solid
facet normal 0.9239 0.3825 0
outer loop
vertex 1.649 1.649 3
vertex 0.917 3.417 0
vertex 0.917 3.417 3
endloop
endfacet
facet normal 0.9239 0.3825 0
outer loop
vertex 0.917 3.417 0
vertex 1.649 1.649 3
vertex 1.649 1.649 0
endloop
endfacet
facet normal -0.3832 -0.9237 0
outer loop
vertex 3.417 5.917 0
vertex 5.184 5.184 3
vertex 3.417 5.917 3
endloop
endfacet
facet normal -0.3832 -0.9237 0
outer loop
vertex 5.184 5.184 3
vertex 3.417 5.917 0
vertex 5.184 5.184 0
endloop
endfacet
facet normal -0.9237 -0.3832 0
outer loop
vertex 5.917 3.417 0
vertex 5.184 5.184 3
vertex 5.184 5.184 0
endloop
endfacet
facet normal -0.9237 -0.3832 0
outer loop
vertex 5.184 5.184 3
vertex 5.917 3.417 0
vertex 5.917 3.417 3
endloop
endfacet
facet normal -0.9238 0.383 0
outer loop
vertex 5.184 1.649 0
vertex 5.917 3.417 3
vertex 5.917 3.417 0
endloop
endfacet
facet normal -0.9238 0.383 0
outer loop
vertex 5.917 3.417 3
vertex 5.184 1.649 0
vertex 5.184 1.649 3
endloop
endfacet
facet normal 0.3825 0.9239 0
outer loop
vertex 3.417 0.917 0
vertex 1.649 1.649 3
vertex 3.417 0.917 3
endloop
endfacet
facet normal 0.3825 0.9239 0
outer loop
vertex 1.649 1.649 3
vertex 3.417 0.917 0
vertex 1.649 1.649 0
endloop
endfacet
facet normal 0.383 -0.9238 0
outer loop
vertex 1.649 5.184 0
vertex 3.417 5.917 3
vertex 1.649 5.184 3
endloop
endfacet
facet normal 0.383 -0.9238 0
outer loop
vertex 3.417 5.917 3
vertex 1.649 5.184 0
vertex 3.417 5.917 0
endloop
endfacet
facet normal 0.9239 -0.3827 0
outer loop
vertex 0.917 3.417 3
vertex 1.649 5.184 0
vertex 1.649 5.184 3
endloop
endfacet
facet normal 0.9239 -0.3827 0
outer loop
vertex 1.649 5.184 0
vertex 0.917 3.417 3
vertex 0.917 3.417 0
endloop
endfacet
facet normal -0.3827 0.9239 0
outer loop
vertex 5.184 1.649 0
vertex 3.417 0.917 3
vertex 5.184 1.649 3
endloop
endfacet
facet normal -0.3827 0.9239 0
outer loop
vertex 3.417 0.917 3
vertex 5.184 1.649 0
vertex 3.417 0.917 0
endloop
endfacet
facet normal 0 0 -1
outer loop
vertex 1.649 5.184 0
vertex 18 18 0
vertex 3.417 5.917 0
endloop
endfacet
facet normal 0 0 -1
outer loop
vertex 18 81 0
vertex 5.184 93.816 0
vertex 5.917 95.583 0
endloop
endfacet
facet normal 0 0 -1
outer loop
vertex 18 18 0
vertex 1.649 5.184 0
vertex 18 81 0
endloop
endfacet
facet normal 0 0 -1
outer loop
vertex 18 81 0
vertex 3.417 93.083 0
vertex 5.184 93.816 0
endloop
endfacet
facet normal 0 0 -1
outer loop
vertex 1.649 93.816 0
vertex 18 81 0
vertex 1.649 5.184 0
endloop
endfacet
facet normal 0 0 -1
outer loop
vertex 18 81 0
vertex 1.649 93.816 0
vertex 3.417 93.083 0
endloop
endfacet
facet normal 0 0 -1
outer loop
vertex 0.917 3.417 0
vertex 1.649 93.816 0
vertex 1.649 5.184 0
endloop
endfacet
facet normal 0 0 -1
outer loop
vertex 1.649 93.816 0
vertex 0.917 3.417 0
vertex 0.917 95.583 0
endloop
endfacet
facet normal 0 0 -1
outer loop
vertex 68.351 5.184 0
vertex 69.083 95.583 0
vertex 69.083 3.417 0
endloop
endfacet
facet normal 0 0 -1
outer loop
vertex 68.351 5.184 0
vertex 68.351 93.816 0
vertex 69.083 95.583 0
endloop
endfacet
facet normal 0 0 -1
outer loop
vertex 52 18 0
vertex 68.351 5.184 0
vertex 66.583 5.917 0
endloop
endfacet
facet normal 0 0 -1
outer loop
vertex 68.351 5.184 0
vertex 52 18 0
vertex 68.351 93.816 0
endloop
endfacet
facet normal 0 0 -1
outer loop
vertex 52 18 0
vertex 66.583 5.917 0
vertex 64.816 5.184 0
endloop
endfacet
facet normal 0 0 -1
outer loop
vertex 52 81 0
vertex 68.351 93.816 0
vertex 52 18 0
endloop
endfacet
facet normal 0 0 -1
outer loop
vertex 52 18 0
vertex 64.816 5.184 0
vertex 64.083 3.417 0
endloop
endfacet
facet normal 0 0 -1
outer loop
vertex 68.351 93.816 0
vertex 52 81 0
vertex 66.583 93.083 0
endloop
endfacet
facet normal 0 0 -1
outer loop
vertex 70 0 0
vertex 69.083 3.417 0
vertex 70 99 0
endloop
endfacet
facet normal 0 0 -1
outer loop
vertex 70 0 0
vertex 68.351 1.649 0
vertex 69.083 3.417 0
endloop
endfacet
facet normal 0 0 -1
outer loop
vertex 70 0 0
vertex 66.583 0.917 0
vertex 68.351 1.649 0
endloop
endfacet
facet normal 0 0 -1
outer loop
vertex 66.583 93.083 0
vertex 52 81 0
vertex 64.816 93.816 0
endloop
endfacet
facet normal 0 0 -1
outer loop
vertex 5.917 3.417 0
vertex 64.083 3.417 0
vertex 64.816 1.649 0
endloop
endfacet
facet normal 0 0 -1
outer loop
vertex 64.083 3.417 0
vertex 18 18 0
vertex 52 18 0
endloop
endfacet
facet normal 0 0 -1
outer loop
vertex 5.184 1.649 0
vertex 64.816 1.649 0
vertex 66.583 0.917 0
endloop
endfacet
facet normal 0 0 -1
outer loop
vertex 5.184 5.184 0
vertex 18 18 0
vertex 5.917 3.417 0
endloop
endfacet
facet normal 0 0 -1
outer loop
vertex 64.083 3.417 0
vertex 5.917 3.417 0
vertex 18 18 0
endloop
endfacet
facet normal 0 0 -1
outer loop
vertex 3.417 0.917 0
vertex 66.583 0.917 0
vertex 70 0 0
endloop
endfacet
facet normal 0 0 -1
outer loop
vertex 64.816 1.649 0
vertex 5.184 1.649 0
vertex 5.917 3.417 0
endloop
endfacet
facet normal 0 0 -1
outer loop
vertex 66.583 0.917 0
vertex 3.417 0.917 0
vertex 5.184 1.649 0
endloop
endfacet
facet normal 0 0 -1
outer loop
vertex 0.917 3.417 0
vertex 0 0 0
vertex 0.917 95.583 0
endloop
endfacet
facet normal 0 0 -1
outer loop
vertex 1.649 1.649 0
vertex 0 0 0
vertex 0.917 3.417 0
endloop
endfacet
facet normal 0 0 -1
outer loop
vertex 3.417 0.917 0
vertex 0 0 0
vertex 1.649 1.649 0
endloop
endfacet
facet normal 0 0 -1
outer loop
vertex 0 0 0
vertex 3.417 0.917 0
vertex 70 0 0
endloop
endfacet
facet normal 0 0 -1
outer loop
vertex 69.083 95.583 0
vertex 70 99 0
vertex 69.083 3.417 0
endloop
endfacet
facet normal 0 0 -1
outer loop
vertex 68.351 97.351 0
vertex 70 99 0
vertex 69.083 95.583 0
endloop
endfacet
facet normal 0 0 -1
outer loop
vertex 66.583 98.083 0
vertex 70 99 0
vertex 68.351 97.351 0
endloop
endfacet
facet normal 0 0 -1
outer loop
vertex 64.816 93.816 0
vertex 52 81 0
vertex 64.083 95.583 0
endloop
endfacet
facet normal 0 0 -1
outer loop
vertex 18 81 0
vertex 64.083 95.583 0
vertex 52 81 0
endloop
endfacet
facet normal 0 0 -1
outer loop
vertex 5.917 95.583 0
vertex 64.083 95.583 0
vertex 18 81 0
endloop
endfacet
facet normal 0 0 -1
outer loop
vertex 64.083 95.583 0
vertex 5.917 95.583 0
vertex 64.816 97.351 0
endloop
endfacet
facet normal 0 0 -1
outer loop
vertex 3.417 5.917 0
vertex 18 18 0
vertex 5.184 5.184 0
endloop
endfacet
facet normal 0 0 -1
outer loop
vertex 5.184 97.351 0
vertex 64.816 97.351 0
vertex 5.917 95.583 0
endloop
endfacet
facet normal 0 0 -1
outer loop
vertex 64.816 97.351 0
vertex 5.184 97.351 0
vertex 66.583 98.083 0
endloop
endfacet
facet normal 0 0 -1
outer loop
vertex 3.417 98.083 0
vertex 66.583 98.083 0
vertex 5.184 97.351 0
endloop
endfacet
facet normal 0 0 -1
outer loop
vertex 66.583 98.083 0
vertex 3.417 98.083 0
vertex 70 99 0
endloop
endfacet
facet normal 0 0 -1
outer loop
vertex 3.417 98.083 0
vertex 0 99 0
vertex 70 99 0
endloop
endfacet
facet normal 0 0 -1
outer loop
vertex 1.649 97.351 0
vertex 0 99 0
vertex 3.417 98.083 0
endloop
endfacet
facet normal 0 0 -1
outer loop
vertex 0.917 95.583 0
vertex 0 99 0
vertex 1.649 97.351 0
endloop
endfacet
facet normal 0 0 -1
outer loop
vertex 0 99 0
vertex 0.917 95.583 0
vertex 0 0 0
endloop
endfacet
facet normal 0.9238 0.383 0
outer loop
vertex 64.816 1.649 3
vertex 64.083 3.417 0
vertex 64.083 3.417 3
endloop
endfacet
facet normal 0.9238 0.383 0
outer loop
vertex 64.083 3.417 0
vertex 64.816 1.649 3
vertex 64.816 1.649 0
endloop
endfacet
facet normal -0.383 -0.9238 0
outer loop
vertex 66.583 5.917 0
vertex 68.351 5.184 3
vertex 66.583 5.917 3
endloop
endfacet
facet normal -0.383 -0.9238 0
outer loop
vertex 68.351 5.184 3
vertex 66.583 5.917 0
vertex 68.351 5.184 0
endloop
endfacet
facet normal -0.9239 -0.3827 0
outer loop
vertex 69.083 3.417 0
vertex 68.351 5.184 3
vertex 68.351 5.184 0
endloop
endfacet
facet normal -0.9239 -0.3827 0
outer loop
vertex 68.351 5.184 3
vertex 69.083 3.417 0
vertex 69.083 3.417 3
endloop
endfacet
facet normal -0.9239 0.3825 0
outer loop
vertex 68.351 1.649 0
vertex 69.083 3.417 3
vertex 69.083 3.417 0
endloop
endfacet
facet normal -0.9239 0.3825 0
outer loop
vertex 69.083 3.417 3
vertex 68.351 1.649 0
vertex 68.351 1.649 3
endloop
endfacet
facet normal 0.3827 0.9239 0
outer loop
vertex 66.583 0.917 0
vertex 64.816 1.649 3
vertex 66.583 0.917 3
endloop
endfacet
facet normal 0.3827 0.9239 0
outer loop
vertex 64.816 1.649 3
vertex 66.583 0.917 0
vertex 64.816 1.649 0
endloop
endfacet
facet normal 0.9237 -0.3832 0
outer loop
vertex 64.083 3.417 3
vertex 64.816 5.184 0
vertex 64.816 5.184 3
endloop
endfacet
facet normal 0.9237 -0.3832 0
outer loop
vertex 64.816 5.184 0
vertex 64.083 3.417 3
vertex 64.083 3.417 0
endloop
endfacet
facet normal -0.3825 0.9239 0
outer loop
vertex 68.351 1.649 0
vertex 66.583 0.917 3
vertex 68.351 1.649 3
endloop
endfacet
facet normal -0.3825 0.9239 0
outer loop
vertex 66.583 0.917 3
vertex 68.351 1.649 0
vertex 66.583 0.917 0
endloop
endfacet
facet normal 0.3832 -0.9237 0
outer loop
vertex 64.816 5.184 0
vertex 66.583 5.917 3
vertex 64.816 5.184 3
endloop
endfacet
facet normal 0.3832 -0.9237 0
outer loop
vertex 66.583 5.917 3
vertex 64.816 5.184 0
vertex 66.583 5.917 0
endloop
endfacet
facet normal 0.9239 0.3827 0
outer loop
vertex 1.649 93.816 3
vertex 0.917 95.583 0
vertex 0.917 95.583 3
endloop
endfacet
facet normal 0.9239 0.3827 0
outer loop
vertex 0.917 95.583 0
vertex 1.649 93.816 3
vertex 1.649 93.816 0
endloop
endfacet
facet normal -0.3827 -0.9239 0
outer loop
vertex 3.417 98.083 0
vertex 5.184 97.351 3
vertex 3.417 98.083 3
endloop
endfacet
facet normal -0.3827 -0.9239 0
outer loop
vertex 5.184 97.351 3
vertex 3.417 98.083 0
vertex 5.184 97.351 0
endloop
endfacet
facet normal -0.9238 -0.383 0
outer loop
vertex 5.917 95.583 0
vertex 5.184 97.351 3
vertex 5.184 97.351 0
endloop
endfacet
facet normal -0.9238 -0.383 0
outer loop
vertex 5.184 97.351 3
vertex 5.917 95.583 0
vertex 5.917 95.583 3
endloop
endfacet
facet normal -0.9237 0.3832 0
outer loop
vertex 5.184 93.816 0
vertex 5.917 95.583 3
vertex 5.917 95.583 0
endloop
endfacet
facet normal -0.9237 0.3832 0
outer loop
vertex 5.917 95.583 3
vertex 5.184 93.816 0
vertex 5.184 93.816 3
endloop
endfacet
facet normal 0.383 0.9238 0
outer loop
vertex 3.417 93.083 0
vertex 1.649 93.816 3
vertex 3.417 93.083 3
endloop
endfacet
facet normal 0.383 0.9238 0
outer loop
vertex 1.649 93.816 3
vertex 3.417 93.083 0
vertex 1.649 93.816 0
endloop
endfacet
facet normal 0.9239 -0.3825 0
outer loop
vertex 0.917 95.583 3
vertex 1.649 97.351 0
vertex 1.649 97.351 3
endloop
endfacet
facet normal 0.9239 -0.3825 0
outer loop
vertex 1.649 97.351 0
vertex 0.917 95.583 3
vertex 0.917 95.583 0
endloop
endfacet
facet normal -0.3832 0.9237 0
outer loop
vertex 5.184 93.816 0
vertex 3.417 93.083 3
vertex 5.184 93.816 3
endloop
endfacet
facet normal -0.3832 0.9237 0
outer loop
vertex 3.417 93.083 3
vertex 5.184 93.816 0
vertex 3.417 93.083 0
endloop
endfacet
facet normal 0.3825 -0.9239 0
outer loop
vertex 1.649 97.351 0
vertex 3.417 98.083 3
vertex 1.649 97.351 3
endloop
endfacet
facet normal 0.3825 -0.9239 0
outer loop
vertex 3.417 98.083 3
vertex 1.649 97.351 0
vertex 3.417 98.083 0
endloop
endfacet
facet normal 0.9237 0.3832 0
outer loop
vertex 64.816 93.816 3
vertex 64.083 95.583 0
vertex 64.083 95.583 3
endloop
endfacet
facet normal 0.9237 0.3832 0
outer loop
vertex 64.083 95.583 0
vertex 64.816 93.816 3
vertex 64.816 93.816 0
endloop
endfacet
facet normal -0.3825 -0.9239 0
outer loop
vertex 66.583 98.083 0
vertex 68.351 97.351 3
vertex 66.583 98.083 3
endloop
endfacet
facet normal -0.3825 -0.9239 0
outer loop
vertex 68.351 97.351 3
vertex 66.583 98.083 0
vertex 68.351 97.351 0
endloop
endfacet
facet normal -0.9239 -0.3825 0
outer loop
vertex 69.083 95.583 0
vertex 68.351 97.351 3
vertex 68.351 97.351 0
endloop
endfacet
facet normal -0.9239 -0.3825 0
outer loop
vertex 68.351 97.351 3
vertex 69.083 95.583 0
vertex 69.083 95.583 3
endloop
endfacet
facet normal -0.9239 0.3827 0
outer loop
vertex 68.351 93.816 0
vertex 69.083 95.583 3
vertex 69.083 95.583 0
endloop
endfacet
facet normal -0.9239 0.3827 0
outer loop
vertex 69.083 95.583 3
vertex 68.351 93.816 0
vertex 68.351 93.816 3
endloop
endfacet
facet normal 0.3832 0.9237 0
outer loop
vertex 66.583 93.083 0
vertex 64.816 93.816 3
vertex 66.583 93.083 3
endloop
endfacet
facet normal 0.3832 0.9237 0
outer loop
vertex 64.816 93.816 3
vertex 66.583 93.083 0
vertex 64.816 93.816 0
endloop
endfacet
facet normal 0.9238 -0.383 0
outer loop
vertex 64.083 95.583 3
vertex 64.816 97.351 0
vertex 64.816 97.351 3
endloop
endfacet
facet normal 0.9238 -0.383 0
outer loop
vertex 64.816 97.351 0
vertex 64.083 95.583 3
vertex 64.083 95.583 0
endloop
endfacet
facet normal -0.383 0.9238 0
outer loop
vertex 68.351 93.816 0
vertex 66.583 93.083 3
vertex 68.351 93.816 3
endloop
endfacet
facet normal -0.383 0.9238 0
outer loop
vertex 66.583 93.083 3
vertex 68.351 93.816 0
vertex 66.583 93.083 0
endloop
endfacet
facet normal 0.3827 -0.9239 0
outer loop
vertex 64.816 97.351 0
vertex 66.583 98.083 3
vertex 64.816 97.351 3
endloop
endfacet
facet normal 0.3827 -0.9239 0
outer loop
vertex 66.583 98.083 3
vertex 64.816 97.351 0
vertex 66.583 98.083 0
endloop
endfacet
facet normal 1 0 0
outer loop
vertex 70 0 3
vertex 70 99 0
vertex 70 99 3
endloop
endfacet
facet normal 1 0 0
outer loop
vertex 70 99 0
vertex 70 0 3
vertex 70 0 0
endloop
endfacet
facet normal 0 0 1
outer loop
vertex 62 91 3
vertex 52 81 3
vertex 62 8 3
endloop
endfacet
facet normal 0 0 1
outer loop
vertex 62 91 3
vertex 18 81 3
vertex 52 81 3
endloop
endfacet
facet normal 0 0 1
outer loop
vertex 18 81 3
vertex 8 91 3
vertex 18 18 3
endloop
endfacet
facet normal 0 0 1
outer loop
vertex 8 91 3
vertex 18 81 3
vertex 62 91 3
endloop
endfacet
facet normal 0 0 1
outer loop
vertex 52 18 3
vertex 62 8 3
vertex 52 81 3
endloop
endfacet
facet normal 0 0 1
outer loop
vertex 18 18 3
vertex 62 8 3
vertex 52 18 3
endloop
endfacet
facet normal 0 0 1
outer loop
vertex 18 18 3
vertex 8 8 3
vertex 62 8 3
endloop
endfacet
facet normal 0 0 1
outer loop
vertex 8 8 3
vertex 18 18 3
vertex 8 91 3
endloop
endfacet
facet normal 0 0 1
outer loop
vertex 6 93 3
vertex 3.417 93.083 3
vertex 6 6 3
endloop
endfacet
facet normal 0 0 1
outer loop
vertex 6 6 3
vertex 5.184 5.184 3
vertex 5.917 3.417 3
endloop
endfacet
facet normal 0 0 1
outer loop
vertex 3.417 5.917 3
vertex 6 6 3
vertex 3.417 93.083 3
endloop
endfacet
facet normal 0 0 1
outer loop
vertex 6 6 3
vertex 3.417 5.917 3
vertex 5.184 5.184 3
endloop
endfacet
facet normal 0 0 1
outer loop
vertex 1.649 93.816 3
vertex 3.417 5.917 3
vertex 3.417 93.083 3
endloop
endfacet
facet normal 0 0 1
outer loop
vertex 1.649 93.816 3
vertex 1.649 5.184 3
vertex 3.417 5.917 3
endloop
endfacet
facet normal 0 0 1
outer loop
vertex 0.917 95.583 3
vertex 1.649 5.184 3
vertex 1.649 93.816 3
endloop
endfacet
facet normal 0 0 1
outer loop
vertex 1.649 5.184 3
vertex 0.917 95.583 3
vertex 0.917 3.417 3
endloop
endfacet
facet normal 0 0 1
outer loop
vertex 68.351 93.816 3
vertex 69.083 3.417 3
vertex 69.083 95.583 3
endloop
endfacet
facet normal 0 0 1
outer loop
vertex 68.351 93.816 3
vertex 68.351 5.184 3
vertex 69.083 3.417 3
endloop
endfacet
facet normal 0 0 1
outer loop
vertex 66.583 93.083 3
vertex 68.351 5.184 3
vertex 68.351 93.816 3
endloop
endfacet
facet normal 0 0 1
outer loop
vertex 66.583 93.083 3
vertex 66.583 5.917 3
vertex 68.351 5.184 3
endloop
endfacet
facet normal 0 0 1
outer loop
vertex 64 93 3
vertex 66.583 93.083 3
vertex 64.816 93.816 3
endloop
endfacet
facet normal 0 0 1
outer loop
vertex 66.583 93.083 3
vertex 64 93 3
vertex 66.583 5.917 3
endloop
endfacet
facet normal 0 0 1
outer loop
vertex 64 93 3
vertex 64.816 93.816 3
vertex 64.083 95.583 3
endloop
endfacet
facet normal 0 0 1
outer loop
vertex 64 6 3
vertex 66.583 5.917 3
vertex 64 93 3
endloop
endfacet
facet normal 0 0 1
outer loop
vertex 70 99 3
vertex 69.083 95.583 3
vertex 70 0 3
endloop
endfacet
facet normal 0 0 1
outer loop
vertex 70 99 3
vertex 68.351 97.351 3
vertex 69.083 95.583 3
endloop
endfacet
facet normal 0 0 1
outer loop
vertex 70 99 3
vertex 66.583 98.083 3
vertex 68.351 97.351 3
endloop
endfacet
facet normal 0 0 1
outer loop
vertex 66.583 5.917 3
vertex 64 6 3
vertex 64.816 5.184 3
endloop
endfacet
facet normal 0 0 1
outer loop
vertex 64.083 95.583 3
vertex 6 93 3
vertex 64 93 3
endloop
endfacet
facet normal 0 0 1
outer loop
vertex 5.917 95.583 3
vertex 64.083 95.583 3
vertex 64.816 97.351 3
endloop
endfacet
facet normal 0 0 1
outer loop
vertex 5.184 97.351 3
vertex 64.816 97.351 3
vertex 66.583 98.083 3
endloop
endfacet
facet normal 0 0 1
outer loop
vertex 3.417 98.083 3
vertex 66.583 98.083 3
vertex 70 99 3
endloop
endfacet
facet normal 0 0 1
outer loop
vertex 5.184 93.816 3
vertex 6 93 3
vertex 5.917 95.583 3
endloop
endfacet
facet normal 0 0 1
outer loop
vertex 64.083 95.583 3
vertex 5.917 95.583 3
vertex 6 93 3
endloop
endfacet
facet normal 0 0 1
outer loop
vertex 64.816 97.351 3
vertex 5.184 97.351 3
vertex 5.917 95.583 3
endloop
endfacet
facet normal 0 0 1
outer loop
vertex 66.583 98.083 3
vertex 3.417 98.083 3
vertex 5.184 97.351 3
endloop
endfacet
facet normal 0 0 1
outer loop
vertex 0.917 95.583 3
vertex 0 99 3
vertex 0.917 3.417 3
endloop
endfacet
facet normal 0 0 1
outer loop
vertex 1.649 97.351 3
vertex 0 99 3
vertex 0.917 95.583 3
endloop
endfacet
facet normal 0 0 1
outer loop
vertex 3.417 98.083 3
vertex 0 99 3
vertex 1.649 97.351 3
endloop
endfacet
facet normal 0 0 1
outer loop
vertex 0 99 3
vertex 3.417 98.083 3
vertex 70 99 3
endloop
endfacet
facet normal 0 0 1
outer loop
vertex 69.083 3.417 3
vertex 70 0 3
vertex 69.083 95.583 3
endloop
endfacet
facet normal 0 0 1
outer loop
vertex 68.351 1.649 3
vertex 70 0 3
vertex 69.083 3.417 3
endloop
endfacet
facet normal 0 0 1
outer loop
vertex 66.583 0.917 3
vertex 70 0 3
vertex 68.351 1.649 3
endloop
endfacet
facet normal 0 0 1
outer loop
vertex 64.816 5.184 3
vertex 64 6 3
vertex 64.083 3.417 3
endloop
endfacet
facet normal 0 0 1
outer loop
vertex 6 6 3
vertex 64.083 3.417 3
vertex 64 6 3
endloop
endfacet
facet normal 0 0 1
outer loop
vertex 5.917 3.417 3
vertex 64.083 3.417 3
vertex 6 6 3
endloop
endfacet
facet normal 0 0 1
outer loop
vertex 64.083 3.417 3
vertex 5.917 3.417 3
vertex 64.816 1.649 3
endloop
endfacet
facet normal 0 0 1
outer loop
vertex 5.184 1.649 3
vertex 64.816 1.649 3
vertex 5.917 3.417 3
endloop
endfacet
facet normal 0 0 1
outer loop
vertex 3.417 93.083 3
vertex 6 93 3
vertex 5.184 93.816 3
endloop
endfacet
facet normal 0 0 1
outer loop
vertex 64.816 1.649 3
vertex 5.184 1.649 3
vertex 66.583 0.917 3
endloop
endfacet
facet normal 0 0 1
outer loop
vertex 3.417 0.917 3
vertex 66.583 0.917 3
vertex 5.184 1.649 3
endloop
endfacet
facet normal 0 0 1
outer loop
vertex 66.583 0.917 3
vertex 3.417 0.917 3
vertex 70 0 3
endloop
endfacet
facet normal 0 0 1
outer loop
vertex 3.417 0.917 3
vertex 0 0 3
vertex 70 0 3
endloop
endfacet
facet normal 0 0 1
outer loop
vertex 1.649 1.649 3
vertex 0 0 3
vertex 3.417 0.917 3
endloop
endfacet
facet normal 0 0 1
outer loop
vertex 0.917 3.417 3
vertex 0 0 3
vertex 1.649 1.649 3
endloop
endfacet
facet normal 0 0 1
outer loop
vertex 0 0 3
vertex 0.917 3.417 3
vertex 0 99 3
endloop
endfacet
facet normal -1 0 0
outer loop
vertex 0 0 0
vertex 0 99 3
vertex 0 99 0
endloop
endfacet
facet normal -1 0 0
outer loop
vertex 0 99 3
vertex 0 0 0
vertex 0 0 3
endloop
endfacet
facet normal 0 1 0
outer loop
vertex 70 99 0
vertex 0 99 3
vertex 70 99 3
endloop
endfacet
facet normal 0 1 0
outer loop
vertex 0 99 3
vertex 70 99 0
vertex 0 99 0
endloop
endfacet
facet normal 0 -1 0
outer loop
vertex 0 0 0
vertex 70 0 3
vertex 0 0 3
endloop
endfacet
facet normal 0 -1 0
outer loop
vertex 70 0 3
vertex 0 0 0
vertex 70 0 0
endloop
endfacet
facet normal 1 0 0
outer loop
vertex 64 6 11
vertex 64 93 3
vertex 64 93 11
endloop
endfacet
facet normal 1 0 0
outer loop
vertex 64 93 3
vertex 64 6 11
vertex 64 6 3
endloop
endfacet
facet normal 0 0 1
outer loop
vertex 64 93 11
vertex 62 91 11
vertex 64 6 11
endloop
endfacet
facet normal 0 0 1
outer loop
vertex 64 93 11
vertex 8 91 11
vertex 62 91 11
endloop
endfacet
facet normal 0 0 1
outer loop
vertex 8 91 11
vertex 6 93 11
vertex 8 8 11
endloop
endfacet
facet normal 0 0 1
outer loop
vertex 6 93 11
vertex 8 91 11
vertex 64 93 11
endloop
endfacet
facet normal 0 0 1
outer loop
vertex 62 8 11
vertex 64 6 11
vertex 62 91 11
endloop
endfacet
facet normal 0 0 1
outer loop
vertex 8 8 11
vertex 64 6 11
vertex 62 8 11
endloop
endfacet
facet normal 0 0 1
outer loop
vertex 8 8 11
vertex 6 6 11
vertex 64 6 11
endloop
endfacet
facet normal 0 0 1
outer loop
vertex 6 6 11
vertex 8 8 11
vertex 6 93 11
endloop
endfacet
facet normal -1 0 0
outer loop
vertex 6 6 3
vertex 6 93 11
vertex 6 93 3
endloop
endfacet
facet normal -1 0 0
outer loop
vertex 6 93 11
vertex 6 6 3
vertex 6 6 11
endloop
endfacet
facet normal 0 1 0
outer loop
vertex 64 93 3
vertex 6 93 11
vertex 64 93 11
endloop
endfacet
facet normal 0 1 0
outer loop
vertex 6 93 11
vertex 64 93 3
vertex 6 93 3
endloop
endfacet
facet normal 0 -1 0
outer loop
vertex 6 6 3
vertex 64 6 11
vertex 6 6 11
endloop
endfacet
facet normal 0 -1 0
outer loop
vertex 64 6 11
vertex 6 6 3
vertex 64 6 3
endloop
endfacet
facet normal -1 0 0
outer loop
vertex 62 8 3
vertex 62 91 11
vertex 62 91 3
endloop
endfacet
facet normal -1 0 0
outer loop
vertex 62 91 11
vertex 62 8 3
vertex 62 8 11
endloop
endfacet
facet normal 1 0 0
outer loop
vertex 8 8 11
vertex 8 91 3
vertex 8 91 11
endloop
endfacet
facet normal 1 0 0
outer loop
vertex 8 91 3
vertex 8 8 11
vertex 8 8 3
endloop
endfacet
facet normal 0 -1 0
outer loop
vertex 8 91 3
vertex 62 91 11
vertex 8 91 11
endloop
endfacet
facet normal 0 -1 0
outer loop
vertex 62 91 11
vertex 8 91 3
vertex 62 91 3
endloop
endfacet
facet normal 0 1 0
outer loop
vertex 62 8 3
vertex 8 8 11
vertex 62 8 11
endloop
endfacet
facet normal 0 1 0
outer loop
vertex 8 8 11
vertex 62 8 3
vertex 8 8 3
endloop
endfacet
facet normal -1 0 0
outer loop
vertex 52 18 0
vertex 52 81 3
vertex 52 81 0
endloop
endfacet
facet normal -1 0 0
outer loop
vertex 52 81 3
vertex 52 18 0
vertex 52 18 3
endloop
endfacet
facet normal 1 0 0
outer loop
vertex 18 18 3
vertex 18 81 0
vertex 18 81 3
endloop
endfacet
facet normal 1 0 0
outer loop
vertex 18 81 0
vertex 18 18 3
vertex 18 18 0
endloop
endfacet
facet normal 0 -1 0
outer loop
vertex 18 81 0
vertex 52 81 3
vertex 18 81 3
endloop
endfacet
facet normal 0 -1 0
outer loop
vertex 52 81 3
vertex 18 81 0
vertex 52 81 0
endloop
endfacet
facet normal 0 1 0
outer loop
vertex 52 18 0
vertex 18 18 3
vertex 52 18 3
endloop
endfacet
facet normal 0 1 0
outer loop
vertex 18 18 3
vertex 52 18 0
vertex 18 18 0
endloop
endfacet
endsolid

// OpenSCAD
breadboardWidth = 54;
breadboardLength = 83;
breadboardHeight = 8;
breadboardBrim = 10;

wallThickness =2;
sledThickness = 3;
sledBrim = 6;

holeDiameter = 5;
holeRadius = 2.5;

Width = breadboardWidth + wallThickness*2 + sledBrim*2;
Length = breadboardLength + wallThickness*2 + sledBrim*2;

module breadboardHolder(){
difference(){
cube([breadboardWidth + wallThickness*2, breadboardLength + wallThickness*2, breadboardHeight]);
translate([wallThickness, wallThickness, 0]) cube([breadboardWidth, breadboardLength, breadboardHeight]);
}
}

module mountHoles(){
translate([sledBrim / 2 + (holeRadius / 6), sledBrim / 2 + (holeRadius / 6), 0]) cylinder(sledThickness + 1, holeRadius, holeRadius);
translate([Width - sledBrim / 2 - (holeRadius / 6), sledBrim / 2 + (holeRadius / 6), 0]) cylinder(sledThickness + 1, holeRadius, holeRadius);
translate([sledBrim / 2 + (holeRadius / 6), Length - sledBrim / 2 - (holeRadius / 6), 0]) cylinder(sledThickness + 1, holeRadius, holeRadius);
translate([Width - sledBrim / 2 - (holeRadius / 6), Length - sledBrim / 2 - (holeRadius / 6), 0]) cylinder(sledThickness + 1, holeRadius, holeRadius);
}

module cutout(){
	translate([(Width / 2) - ((breadboardWidth -(breadboardBrim*2)) / 2) , (Length / 2) - (breadboardLength - (breadboardBrim*2)) / 2, 0])
	cube([breadboardWidth -(breadboardBrim*2), breadboardLength - (breadboardBrim*2), sledThickness + 1]);
}

module sled(){
difference(){
cube([breadboardWidth + wallThickness*2 + sledBrim*2, breadboardLength + wallThickness*2 + sledBrim*2, sledThickness]);
mountHoles();

}
}

module breadboardMount(){
difference(){
union(){
sled();
translate([sledBrim , sledBrim , sledThickness])breadboardHolder();
}
cutout();
}
}

breadboardMount();
